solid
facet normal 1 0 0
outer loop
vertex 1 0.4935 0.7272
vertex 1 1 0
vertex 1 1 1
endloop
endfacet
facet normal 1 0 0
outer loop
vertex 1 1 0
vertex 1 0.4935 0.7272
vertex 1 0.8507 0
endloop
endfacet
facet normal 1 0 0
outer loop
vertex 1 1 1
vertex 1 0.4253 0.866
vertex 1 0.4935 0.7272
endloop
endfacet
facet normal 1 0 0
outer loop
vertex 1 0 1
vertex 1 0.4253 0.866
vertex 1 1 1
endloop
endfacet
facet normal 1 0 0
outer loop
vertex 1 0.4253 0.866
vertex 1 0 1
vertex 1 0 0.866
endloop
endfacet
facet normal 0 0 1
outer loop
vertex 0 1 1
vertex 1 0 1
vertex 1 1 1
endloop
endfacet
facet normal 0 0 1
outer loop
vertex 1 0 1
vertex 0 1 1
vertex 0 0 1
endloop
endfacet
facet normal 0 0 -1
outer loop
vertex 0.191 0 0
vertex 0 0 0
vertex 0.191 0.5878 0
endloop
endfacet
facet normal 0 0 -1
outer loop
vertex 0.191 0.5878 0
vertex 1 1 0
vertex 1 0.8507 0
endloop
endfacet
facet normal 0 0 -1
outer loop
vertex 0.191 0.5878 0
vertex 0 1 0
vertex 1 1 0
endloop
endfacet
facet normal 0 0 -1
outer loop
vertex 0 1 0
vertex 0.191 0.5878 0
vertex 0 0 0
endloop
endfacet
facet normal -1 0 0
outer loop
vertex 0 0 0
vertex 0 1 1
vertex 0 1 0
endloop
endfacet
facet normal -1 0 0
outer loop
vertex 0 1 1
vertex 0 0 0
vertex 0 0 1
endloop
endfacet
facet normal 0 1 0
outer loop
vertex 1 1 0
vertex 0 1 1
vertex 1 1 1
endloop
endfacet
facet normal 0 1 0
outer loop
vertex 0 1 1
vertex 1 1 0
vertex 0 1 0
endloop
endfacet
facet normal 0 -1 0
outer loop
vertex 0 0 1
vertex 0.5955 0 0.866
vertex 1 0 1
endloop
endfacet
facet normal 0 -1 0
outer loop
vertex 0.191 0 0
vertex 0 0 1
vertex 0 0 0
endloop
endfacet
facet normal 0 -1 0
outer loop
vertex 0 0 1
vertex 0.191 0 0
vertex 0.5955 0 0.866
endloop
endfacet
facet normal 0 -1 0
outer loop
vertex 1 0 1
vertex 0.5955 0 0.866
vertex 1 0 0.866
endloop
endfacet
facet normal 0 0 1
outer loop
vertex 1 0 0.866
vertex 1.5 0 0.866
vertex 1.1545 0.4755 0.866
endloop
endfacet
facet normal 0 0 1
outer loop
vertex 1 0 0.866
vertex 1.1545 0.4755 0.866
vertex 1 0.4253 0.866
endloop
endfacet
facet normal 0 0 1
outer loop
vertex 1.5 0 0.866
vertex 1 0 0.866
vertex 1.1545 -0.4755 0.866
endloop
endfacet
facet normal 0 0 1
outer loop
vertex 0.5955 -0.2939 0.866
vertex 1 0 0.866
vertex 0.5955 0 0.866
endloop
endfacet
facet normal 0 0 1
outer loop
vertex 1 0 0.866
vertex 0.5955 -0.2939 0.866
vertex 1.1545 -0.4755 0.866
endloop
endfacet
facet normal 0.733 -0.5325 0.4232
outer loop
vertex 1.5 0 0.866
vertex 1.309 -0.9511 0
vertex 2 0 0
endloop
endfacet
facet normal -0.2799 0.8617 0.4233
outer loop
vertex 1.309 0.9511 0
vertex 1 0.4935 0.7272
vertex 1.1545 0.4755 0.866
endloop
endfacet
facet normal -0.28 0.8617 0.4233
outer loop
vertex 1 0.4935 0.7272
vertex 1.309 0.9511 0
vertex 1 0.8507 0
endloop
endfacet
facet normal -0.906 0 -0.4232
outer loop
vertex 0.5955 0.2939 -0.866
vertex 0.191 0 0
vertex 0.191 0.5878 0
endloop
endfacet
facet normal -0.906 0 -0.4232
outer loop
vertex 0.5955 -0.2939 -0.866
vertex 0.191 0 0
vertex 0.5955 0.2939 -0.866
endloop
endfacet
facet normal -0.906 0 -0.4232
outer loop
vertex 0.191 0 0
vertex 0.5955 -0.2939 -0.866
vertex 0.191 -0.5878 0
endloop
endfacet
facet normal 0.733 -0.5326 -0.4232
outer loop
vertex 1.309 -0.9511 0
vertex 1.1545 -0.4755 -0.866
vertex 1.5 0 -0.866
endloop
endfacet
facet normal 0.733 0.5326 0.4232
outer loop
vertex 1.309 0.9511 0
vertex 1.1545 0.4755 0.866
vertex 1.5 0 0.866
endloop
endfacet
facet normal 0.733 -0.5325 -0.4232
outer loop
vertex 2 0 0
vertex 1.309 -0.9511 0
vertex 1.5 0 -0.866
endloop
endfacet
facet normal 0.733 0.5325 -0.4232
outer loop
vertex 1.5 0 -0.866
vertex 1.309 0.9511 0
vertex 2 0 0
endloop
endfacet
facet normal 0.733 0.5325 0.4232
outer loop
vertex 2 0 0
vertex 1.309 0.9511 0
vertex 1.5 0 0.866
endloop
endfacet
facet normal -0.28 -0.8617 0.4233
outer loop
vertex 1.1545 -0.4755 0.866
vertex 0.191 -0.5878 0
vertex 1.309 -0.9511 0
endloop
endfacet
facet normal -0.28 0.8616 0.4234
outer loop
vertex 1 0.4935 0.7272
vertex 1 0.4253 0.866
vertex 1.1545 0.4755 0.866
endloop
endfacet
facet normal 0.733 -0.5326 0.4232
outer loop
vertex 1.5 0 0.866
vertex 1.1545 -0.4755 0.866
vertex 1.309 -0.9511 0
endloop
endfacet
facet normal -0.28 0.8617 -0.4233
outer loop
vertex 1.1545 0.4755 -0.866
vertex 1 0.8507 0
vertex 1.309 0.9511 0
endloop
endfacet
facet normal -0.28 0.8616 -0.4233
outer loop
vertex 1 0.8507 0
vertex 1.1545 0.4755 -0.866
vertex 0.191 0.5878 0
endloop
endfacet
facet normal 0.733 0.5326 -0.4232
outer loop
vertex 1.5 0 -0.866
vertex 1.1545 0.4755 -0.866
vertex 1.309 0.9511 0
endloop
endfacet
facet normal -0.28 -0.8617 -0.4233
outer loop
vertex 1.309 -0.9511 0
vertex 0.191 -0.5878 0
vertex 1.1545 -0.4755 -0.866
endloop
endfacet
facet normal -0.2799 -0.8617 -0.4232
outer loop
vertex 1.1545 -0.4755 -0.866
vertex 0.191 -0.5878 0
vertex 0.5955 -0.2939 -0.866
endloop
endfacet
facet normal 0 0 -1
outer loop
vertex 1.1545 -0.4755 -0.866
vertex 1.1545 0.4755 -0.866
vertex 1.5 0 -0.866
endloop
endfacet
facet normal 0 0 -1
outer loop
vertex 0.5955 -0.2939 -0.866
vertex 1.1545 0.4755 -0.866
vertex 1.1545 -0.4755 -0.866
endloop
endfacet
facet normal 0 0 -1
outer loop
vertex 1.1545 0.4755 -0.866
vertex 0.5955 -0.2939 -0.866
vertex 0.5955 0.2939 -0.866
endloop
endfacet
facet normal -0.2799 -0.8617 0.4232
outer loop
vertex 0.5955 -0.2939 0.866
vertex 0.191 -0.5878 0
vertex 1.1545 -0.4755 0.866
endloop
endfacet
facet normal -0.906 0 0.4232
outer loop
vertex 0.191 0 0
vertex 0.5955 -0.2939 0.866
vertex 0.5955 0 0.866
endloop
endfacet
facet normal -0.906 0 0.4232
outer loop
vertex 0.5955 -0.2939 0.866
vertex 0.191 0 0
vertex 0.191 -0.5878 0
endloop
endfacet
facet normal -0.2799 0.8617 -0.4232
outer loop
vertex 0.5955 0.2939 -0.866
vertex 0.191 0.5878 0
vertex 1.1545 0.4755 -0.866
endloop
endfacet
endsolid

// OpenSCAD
module d() { for (i = [0:$children - 1]) translate([i, 0, 0]) children(i); }
d() { cube(); sphere(); }
